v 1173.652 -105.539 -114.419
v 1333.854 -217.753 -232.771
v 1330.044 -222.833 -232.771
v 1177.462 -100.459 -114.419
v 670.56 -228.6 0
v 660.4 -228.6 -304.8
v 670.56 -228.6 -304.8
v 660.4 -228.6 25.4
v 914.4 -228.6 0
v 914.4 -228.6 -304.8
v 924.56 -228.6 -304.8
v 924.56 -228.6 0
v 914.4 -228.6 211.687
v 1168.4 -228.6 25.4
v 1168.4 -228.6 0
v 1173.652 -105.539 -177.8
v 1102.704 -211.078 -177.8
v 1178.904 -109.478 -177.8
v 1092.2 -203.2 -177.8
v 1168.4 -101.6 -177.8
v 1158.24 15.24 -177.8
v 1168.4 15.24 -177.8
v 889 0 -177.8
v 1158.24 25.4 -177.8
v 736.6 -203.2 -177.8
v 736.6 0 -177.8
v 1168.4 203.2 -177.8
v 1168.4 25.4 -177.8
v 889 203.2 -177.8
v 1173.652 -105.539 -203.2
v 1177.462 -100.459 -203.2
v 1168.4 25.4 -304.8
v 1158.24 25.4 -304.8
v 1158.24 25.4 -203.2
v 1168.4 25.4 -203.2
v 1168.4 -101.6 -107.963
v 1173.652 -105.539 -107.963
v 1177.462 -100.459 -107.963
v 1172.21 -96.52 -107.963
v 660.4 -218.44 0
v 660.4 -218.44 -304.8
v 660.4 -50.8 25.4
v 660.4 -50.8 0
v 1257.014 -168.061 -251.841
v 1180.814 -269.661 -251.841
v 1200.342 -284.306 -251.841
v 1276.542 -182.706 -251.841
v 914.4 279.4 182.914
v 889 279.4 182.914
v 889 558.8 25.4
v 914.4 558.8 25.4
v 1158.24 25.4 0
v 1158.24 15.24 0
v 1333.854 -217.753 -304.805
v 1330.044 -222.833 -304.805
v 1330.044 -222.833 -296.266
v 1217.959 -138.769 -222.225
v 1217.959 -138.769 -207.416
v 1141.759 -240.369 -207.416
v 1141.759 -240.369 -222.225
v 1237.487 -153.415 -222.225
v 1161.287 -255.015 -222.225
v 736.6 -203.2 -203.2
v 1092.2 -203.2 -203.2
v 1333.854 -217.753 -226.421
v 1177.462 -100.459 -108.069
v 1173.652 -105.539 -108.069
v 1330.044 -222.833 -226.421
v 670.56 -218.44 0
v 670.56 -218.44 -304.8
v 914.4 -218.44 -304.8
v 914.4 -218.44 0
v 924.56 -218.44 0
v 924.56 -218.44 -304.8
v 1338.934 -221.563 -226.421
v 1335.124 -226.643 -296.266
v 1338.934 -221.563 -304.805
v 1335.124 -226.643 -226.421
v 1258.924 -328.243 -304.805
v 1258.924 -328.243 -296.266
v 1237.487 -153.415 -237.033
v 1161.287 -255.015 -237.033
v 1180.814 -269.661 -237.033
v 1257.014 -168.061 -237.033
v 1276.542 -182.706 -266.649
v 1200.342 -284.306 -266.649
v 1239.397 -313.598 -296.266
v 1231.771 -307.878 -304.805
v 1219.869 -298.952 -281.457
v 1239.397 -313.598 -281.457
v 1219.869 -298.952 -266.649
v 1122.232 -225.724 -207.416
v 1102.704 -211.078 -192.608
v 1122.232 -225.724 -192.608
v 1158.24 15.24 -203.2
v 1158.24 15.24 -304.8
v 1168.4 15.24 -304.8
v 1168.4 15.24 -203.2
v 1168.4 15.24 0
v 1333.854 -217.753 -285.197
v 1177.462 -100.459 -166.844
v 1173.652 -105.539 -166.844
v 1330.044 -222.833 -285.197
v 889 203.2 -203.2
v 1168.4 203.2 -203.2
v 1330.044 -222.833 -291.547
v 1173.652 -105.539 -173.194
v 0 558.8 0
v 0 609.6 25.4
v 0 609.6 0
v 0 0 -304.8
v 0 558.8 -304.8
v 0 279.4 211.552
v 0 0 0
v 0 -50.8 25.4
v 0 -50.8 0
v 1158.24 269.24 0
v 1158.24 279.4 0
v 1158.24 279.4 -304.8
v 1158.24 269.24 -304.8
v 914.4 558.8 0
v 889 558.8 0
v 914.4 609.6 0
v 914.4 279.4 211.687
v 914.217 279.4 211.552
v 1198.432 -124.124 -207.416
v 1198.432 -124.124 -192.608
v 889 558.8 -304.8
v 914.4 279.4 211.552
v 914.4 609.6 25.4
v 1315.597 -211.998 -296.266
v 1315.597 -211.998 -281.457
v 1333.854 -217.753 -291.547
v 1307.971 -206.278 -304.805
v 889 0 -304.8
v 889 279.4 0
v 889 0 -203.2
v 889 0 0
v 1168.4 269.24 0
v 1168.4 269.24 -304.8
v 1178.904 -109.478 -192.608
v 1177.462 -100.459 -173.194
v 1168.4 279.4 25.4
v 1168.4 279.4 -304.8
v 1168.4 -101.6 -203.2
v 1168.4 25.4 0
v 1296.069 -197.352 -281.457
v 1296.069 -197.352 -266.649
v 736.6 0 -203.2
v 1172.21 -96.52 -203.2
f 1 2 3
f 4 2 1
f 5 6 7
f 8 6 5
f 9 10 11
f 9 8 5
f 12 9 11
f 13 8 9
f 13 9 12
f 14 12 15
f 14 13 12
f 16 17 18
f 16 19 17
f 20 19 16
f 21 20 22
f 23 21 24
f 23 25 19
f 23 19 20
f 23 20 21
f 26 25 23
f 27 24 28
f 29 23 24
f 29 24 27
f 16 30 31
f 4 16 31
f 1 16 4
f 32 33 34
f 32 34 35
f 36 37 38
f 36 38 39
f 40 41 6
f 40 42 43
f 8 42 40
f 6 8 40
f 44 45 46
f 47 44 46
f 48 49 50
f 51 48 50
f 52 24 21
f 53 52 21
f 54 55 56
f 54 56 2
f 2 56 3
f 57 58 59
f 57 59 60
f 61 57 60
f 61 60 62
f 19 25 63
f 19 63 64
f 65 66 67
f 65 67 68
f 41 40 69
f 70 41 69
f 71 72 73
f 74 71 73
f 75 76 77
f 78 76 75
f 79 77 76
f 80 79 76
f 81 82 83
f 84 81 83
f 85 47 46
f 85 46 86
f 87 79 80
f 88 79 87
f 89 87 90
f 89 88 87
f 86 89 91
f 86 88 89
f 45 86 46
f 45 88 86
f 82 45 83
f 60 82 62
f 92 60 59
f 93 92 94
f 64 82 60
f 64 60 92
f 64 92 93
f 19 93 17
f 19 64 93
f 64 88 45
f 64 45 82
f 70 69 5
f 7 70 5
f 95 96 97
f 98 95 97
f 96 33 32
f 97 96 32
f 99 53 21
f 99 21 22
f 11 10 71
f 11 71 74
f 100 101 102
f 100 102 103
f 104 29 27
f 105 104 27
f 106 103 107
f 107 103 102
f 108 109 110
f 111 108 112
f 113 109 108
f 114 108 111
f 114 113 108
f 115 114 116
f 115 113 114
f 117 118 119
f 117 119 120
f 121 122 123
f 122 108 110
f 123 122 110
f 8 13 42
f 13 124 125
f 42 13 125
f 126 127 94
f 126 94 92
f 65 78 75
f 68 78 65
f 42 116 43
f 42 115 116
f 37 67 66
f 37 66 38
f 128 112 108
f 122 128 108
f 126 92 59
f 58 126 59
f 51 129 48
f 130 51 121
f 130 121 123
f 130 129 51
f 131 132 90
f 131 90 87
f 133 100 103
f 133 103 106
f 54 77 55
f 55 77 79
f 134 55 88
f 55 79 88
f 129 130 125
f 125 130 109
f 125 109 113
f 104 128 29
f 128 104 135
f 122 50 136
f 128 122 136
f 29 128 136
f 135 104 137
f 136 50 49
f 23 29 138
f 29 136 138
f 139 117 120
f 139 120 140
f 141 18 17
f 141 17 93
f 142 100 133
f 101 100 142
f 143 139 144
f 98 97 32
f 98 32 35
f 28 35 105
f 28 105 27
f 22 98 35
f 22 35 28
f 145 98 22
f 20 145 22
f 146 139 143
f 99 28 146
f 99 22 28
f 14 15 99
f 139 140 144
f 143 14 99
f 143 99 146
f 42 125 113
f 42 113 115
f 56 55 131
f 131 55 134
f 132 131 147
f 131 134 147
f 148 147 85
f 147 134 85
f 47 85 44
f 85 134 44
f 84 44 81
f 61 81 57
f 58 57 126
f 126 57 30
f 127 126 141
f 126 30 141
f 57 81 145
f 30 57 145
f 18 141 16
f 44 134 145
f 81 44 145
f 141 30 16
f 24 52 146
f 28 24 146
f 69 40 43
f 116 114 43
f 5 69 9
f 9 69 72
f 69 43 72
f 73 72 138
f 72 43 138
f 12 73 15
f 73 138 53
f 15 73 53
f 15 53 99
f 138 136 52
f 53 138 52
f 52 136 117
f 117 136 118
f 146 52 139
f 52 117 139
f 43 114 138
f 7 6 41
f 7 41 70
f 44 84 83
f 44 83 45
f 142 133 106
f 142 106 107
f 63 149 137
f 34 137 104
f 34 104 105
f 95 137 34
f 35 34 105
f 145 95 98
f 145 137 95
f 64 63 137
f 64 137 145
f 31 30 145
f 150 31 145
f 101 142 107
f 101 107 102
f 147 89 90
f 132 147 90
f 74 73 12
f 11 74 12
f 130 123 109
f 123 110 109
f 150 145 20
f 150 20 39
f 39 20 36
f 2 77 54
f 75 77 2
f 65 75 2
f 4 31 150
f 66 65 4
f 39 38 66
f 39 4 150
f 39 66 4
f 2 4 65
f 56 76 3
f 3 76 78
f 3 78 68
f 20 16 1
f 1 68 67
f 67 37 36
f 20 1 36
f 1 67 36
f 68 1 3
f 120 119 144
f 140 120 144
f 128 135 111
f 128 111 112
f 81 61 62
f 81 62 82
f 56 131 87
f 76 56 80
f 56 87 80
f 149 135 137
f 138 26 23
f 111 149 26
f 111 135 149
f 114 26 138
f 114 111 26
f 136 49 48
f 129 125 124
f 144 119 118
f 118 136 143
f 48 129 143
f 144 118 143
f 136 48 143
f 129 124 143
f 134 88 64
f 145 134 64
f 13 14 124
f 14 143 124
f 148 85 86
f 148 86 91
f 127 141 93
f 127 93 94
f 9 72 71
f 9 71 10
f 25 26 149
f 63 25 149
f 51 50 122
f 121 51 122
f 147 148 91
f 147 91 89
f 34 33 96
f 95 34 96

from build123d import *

# Parameters (mm, degrees)
F0_W           = 558.8
F0_H           = 304.8
F1_DEPTH       = 889
F3_DEPTH       = 889
F5_DEPTH       = 25.4
F7_DEPTH       = 330.2
F7_DEPTH_BACK  = 177.8
F8_W           = 10.16
F8_H           = 10.16
F9_DEPTH       = 304.8
F11_DEPTH      = 203.2
F11_DEPTH_BACK = 203.2
F14_DEPTH      = 25.4
F15_W          = 6.35
F15_H          = 127.005368185
F16_DEPTH      = 304.8
F18_DEPTH      = 25.4
F19_DEPTH      = 127
F20_W          = 6.5650812721
F20_H          = 95.2373991132
F21_DEPTH      = 6.35
F22_W          = 6.35
F22_H          = 78.3844
F23_DEPTH      = 6.35
F25_DEPTH      = 6.35
F27_DEPTH      = 6.35


# Not quite as in the source:
# - a feature of the source that left no trace in its solid (it failed there, or was rolled back) is left out


with BuildPart() as f1:
    # F0 (on Right) → F1 (new body)
    with BuildSketch(Plane.YZ):
        with Locations((279.4, -152.4)):
            Rectangle(F0_W, F0_H)
    extrude(amount=F1_DEPTH)

    # F2 (on face) → F3 (join)
    with BuildSketch(Plane(origin=(0, 0, 0), x_dir=(0, -1, 0), z_dir=(-1, 0, 0))):
        Polygon((-609.6, 0), (-558.8, 0), (0, 0), (50.8, 0), (50.8, 25.4), (-279.4, 211.5524560213), (-609.6, 25.4), align=None)
    extrude(amount=-F3_DEPTH)

    # F4 (on face) → F5 (join)
    with BuildSketch(Plane.YZ.offset(889)):
        Polygon((-50.8, 25.4), (-50.8, 0), (0, 0), (0, 25.4), (279.4, 182.9136166334), (558.8, 25.4), (558.8, 0), (609.6, 0), (609.6, 25.4), (279.4, 211.5524560213), align=None)
    extrude(amount=F5_DEPTH)

    # F6 (on face) → F7 (join, two sides)
    with BuildSketch(Plane.XZ.offset(50.8)) as f7_sk:
        Polygon((889, 0), (914.4, 0), (1168.4, 0), (1168.4, 25.4), (914.4, 211.6865664721), (660.4, 25.4), (660.4, 0), align=None)
    extrude(amount=-F7_DEPTH)
    extrude(f7_sk.sketch, amount=F7_DEPTH_BACK)

    # F8 (on face) → F9 (join)
    with BuildSketch(Plane(origin=(0, 0, 0), x_dir=(1, 0, 0), z_dir=(0, 0, -1))):
        with Locations((665.48, 223.52)):
            Rectangle(F8_W, F8_H)
        with Locations((1163.32, -274.32)):
            Rectangle(F8_W, F8_H)
        with Locations((1163.32, -20.32)):
            Rectangle(F8_W, F8_H)
        with Locations((919.48, 223.52)):
            Rectangle(F8_W, F8_H)
    extrude(amount=F9_DEPTH)

    # F10 (on face) → F11 (join, two sides)
    with BuildSketch(Plane.XZ) as f11_sk:
        Polygon((1168.4, -177.8), (889, -177.8), (736.6, -177.8), (736.6, -203.2), (1168.4, -203.2), align=None)
    extrude(amount=F11_DEPTH)
    extrude(f11_sk.sketch, amount=-F11_DEPTH_BACK)

    # F13 (on face) → F14 (cut)
    with BuildSketch(Plane.XY.offset(-177.8)):
        Polygon((1092.2, -203.2), (1168.4, -203.2), (1168.4, -101.6), align=None)
    extrude(amount=-F14_DEPTH, mode=Mode.SUBTRACT)

    # F15 (on face) → F16 (join)
    with BuildSketch(Plane(origin=(796.544, -597.408, 0), x_dir=(0.6, 0.8, 0), z_dir=(0.8, -0.6, 0))):
        with Locations((495.935, -241.3026840925)):
            Rectangle(F15_W, F15_H)
    extrude(amount=F16_DEPTH)

    # F17 (on face) → F18 (cut)
    with BuildSketch(Plane(origin=(295.656, 394.208, 0), x_dir=(0.8, -0.6, 0), z_dir=(-0.6, -0.8, 0))):
        Polygon((1170.1436042786, -304.805368185), (995.68, -203.2), (995.68, -304.805368185), align=None)
        Polygon((1300.48, -177.8), (1008.8101625443, -177.8), (1008.8101625443, -192.6082), (1033.2195625443, -192.6082), (1033.2195625443, -207.4164), (1057.6289625443, -207.4164), (1057.6289625443, -222.2246), (1082.0383625443, -222.2246), (1082.0383625443, -237.0328), (1106.4477625443, -237.0328), (1106.4477625443, -251.841), (1130.8571625443, -251.841), (1130.8571625443, -266.6492), (1155.2665625443, -266.6492), (1155.2665625443, -281.4574), (1179.6759625442, -281.4574), (1179.6759625442, -296.2656), (1204.0853625442, -296.2656), (1204.0853625442, -304.805368185), (1300.48, -304.805368185), align=None)
    extrude(amount=-F18_DEPTH, mode=Mode.SUBTRACT)

    # F19 (add): a face of the model
    f19_faces = [f1.faces().sort_by_distance(p)[0] for p in [
        (1167.2257565811, -259.4693174358, -245.1597520789),
    ]]
    extrude(f19_faces, amount=-F19_DEPTH)

    # F20 (on face) → F21 (join)
    with BuildSketch(Plane(origin=(371.856, 495.808, 0), x_dir=(-0.8, 0.6, 0), z_dir=(0.6, 0.8, 0))):
        with Locations((-998.9625406361, -155.5813004434)):
            Rectangle(F20_W, F20_H)
    extrude(amount=F21_DEPTH)

    # F22 (on face) → F23 (join)
    with BuildSketch(Plane(origin=(371.856, 495.808, 0), x_dir=(-0.8, 0.6, 0), z_dir=(0.6, 0.8, 0))):
        with Locations((-1200.9103625442, -265.613168185)):
            Rectangle(F22_W, F22_H)
    extrude(amount=F23_DEPTH)

    # F24 (on face) → F25 (join)
    with BuildSketch(Plane(origin=(375.666, 500.888, 0), x_dir=(-0.8, 0.6, 0), z_dir=(0.6, 0.8, 0))):
        Polygon((-1002.1302700043, -107.9991236329), (-1197.7353625442, -226.420968185), (-1197.7353625442, -232.770968185), (-1002.1302700043, -114.3491236329), align=None)
    extrude(amount=-F25_DEPTH)


with BuildPart() as f27:
    # F26 (on face) → F27 (new body)
    with BuildSketch(Plane(origin=(375.666, 500.888, 0), x_dir=(-0.8, 0.6, 0), z_dir=(0.6, 0.8, 0))):
        Polygon((-1002.2450812721, -166.8442318545), (-1197.7353625442, -285.196568185), (-1197.7353625442, -291.546568185), (-1002.2450812721, -173.1942318545), align=None)
    extrude(amount=-F27_DEPTH)


solid = Compound([f1.part, f27.part])
